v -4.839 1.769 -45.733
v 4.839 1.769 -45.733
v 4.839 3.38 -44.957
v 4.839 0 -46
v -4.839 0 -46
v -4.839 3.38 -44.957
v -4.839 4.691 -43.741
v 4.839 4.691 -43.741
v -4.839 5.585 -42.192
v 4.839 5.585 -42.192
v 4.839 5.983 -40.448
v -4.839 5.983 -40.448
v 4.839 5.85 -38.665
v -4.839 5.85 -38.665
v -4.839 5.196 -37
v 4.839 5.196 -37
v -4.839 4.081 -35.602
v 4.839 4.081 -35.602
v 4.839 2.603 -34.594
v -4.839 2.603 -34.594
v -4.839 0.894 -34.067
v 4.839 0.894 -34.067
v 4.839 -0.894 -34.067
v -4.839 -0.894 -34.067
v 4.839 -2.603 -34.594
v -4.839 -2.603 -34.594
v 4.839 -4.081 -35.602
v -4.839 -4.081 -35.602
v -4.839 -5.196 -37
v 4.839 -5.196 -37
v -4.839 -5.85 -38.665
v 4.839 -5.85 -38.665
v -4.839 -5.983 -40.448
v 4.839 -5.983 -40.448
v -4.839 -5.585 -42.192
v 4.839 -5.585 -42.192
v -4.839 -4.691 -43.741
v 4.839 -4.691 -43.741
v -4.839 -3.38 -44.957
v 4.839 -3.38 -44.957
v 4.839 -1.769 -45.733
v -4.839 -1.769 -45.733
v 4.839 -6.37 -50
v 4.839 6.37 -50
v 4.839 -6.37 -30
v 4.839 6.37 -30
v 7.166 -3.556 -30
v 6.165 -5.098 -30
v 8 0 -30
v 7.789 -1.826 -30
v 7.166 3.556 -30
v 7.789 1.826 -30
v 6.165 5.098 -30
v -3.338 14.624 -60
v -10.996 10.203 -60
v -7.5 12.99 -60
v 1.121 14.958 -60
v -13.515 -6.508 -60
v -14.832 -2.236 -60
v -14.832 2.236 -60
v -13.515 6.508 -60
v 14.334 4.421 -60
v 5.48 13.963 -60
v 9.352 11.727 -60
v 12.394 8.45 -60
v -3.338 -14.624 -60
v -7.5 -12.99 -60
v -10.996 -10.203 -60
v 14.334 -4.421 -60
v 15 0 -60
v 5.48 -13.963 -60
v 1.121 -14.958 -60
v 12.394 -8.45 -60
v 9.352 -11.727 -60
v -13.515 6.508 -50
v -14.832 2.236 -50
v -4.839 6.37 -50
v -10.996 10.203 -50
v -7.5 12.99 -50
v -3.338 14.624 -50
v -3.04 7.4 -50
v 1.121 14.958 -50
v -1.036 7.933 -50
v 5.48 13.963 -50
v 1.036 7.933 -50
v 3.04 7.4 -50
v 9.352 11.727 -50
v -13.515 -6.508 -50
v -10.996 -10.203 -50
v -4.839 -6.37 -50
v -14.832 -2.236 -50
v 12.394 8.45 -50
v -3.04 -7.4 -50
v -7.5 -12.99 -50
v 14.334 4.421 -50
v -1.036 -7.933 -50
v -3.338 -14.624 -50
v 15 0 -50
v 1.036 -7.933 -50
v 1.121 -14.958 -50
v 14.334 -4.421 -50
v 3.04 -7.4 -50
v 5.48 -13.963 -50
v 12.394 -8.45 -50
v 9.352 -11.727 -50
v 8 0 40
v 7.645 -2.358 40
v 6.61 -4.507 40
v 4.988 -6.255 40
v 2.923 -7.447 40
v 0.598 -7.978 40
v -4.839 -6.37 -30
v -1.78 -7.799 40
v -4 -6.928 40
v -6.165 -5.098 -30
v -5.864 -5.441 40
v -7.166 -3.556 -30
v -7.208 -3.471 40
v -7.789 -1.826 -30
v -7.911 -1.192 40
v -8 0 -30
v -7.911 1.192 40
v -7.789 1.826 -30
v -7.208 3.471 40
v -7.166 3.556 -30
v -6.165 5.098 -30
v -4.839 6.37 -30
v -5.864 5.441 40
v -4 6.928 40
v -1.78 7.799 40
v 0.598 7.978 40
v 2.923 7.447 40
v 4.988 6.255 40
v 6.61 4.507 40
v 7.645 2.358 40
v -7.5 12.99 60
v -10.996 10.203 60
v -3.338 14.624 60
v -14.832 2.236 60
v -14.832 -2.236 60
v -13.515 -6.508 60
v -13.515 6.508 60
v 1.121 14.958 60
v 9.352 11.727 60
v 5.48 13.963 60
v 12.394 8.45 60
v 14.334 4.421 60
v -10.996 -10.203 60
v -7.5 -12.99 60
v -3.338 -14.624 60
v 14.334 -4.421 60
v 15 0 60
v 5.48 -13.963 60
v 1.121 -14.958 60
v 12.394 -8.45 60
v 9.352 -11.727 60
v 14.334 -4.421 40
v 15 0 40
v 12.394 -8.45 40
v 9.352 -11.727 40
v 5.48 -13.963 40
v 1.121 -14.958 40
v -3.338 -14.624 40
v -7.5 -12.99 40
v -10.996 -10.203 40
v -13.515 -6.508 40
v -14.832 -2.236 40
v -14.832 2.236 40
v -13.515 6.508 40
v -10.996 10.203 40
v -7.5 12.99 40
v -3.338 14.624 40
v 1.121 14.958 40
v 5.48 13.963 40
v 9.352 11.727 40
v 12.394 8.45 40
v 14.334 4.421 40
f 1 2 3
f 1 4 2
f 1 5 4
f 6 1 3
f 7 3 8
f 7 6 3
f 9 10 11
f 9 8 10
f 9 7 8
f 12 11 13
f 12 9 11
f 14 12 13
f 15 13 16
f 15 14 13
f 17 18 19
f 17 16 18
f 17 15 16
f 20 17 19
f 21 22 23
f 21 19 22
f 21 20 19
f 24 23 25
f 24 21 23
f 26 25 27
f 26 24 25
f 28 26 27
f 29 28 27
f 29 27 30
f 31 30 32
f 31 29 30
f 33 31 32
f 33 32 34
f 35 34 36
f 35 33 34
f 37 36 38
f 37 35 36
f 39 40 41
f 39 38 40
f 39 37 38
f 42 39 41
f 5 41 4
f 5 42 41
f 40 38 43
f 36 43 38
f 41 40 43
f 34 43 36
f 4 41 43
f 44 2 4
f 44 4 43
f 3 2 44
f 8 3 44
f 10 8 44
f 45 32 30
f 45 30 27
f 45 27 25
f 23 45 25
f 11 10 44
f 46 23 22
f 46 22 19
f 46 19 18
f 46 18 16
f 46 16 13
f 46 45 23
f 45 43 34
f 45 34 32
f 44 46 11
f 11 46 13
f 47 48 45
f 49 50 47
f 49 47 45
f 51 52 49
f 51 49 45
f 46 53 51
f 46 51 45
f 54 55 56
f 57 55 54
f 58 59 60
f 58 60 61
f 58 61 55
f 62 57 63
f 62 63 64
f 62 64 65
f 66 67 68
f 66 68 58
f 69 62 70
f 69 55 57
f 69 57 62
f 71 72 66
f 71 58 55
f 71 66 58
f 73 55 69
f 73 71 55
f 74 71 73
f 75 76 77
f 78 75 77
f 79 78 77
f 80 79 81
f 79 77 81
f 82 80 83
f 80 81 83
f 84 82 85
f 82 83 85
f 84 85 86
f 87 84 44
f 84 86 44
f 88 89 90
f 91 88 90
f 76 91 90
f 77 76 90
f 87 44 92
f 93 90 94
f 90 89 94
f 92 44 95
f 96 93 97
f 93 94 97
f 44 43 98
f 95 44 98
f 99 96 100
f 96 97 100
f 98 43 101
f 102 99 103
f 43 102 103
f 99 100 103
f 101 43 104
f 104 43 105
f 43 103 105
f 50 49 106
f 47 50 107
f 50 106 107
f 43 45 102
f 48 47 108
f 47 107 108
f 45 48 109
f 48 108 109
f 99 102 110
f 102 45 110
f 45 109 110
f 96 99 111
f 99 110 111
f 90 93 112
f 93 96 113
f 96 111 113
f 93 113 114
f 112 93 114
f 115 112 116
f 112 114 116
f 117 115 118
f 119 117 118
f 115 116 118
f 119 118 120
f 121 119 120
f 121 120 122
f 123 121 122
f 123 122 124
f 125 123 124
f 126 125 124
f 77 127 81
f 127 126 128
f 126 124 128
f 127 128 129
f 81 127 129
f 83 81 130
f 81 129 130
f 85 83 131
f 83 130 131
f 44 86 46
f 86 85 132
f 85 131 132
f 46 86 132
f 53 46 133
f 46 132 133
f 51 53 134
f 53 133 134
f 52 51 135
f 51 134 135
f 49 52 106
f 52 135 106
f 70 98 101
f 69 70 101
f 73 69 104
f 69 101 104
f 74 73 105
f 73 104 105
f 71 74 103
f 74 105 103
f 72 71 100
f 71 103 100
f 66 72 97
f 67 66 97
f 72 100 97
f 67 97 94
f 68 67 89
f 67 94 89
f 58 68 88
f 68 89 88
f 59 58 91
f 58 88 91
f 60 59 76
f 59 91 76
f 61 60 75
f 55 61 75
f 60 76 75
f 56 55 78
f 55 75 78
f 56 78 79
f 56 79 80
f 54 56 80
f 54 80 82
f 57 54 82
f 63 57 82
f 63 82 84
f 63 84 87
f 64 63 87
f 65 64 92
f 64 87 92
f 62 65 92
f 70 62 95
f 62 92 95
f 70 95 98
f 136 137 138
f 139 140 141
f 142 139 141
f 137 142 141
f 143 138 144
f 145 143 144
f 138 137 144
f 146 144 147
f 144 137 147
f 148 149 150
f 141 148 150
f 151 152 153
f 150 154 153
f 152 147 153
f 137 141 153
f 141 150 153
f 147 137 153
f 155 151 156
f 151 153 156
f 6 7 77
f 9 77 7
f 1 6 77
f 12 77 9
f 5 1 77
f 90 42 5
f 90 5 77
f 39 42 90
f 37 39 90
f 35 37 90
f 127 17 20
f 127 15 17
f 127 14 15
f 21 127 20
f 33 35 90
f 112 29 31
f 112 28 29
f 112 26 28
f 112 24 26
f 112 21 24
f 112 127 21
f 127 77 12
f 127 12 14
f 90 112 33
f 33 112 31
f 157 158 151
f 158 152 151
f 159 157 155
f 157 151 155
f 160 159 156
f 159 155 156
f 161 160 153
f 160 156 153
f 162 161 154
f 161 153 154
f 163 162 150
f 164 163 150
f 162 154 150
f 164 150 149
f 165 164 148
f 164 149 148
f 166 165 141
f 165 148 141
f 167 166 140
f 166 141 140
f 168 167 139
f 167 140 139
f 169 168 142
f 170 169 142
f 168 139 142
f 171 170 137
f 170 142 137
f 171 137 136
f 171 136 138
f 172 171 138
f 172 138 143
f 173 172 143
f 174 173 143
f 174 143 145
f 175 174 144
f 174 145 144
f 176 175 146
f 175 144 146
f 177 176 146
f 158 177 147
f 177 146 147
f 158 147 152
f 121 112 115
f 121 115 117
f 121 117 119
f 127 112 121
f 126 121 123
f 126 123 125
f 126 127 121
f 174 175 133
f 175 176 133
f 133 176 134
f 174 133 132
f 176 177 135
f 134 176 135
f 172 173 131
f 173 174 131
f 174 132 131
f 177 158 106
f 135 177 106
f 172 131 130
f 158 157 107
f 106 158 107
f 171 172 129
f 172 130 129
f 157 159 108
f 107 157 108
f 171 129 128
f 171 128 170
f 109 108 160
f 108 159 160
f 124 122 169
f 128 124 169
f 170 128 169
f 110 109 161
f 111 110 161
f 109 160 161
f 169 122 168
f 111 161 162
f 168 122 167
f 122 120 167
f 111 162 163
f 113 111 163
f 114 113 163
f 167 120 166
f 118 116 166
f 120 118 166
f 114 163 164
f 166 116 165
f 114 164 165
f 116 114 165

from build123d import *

# Parameters (mm, degrees)
CORTE_EXTRUS_O1_DEPTH      = 64.639610307
CORTE_EXTRUS_O1_DEPTH_BACK = 64.639610307
ESBO_O2_R                  = 6
CORTE_EXTRUS_O2_START      = -30
CORTE_EXTRUS_O2_DEPTH      = 30
BOSS_EXTRUDE1_START        = -10
SKETCH1_R                  = 15
BOSS_EXTRUDE1_DEPTH        = 10


with BuildPart() as part:
    # Esboço1 → Revolução1 (revolve)
    with BuildSketch(Plane(origin=(0, 0, 0), x_dir=(0, 0, -1), z_dir=(1, 0, 0)), mode=Mode.PRIVATE) as revolu_o1_sk:
        Polygon((-60, 0), (60, 0), (60, 8), (-40, 8), (-40, 15), (-60, 15), align=None)
    revolve(revolu_o1_sk.sketch.rotate(Axis((0, 0, 60), (0, 0, -1)), 90), axis=Axis((0, 0, 60), (0, 0, -1)))

    # Esboço2 → Corte-extrusão1 (cut, two sides: drawn at the far end of the back side and taken through both)
    with BuildSketch(Plane(origin=(0, 0, 0), x_dir=(0, 0, -1), z_dir=(1, 0, 0)).offset(-CORTE_EXTRUS_O1_DEPTH_BACK)):
        with Locations((40, 0)):
            Circle(ESBO_O2_R)
    extrude(amount=CORTE_EXTRUS_O1_DEPTH + CORTE_EXTRUS_O1_DEPTH_BACK, mode=Mode.SUBTRACT)

    # Esboço3 → Corte-extrusão2 (cut)
    with BuildSketch(Plane(origin=(0, 0, -60), x_dir=(-1, 0, 0), z_dir=(0, 0, -1)).offset(CORTE_EXTRUS_O2_START)):
        with BuildLine():
            Line((-4.839112888, -6.370477726), (-4.839112888, 6.370477726))
            ThreePointArc((-4.839112888, 6.370477726), (-8, 0), (-4.839112888, -6.370477726))
        make_face()
        with BuildLine():
            ThreePointArc((8, 0), (7.166341574, 3.555776771), (4.839112888, 6.370477726))
            Line((4.839112888, 6.370477726), (4.839112888, -6.370477726))
            ThreePointArc((4.839112888, -6.370477726), (7.166341574, -3.555776771), (8, 0))
        make_face()
    extrude(amount=CORTE_EXTRUS_O2_DEPTH, mode=Mode.SUBTRACT)

    # Sketch1 → Boss-Extrude1 (add)
    with BuildSketch(Plane(origin=(0, 0, -60), x_dir=(-1, 0, 0), z_dir=(0, 0, -1)).offset(BOSS_EXTRUDE1_START)):
        with Locations(Location((0, 0, 0), (0, 0, 180))):
            Circle(SKETCH1_R)
    extrude(amount=BOSS_EXTRUDE1_DEPTH)


solid = part.part
